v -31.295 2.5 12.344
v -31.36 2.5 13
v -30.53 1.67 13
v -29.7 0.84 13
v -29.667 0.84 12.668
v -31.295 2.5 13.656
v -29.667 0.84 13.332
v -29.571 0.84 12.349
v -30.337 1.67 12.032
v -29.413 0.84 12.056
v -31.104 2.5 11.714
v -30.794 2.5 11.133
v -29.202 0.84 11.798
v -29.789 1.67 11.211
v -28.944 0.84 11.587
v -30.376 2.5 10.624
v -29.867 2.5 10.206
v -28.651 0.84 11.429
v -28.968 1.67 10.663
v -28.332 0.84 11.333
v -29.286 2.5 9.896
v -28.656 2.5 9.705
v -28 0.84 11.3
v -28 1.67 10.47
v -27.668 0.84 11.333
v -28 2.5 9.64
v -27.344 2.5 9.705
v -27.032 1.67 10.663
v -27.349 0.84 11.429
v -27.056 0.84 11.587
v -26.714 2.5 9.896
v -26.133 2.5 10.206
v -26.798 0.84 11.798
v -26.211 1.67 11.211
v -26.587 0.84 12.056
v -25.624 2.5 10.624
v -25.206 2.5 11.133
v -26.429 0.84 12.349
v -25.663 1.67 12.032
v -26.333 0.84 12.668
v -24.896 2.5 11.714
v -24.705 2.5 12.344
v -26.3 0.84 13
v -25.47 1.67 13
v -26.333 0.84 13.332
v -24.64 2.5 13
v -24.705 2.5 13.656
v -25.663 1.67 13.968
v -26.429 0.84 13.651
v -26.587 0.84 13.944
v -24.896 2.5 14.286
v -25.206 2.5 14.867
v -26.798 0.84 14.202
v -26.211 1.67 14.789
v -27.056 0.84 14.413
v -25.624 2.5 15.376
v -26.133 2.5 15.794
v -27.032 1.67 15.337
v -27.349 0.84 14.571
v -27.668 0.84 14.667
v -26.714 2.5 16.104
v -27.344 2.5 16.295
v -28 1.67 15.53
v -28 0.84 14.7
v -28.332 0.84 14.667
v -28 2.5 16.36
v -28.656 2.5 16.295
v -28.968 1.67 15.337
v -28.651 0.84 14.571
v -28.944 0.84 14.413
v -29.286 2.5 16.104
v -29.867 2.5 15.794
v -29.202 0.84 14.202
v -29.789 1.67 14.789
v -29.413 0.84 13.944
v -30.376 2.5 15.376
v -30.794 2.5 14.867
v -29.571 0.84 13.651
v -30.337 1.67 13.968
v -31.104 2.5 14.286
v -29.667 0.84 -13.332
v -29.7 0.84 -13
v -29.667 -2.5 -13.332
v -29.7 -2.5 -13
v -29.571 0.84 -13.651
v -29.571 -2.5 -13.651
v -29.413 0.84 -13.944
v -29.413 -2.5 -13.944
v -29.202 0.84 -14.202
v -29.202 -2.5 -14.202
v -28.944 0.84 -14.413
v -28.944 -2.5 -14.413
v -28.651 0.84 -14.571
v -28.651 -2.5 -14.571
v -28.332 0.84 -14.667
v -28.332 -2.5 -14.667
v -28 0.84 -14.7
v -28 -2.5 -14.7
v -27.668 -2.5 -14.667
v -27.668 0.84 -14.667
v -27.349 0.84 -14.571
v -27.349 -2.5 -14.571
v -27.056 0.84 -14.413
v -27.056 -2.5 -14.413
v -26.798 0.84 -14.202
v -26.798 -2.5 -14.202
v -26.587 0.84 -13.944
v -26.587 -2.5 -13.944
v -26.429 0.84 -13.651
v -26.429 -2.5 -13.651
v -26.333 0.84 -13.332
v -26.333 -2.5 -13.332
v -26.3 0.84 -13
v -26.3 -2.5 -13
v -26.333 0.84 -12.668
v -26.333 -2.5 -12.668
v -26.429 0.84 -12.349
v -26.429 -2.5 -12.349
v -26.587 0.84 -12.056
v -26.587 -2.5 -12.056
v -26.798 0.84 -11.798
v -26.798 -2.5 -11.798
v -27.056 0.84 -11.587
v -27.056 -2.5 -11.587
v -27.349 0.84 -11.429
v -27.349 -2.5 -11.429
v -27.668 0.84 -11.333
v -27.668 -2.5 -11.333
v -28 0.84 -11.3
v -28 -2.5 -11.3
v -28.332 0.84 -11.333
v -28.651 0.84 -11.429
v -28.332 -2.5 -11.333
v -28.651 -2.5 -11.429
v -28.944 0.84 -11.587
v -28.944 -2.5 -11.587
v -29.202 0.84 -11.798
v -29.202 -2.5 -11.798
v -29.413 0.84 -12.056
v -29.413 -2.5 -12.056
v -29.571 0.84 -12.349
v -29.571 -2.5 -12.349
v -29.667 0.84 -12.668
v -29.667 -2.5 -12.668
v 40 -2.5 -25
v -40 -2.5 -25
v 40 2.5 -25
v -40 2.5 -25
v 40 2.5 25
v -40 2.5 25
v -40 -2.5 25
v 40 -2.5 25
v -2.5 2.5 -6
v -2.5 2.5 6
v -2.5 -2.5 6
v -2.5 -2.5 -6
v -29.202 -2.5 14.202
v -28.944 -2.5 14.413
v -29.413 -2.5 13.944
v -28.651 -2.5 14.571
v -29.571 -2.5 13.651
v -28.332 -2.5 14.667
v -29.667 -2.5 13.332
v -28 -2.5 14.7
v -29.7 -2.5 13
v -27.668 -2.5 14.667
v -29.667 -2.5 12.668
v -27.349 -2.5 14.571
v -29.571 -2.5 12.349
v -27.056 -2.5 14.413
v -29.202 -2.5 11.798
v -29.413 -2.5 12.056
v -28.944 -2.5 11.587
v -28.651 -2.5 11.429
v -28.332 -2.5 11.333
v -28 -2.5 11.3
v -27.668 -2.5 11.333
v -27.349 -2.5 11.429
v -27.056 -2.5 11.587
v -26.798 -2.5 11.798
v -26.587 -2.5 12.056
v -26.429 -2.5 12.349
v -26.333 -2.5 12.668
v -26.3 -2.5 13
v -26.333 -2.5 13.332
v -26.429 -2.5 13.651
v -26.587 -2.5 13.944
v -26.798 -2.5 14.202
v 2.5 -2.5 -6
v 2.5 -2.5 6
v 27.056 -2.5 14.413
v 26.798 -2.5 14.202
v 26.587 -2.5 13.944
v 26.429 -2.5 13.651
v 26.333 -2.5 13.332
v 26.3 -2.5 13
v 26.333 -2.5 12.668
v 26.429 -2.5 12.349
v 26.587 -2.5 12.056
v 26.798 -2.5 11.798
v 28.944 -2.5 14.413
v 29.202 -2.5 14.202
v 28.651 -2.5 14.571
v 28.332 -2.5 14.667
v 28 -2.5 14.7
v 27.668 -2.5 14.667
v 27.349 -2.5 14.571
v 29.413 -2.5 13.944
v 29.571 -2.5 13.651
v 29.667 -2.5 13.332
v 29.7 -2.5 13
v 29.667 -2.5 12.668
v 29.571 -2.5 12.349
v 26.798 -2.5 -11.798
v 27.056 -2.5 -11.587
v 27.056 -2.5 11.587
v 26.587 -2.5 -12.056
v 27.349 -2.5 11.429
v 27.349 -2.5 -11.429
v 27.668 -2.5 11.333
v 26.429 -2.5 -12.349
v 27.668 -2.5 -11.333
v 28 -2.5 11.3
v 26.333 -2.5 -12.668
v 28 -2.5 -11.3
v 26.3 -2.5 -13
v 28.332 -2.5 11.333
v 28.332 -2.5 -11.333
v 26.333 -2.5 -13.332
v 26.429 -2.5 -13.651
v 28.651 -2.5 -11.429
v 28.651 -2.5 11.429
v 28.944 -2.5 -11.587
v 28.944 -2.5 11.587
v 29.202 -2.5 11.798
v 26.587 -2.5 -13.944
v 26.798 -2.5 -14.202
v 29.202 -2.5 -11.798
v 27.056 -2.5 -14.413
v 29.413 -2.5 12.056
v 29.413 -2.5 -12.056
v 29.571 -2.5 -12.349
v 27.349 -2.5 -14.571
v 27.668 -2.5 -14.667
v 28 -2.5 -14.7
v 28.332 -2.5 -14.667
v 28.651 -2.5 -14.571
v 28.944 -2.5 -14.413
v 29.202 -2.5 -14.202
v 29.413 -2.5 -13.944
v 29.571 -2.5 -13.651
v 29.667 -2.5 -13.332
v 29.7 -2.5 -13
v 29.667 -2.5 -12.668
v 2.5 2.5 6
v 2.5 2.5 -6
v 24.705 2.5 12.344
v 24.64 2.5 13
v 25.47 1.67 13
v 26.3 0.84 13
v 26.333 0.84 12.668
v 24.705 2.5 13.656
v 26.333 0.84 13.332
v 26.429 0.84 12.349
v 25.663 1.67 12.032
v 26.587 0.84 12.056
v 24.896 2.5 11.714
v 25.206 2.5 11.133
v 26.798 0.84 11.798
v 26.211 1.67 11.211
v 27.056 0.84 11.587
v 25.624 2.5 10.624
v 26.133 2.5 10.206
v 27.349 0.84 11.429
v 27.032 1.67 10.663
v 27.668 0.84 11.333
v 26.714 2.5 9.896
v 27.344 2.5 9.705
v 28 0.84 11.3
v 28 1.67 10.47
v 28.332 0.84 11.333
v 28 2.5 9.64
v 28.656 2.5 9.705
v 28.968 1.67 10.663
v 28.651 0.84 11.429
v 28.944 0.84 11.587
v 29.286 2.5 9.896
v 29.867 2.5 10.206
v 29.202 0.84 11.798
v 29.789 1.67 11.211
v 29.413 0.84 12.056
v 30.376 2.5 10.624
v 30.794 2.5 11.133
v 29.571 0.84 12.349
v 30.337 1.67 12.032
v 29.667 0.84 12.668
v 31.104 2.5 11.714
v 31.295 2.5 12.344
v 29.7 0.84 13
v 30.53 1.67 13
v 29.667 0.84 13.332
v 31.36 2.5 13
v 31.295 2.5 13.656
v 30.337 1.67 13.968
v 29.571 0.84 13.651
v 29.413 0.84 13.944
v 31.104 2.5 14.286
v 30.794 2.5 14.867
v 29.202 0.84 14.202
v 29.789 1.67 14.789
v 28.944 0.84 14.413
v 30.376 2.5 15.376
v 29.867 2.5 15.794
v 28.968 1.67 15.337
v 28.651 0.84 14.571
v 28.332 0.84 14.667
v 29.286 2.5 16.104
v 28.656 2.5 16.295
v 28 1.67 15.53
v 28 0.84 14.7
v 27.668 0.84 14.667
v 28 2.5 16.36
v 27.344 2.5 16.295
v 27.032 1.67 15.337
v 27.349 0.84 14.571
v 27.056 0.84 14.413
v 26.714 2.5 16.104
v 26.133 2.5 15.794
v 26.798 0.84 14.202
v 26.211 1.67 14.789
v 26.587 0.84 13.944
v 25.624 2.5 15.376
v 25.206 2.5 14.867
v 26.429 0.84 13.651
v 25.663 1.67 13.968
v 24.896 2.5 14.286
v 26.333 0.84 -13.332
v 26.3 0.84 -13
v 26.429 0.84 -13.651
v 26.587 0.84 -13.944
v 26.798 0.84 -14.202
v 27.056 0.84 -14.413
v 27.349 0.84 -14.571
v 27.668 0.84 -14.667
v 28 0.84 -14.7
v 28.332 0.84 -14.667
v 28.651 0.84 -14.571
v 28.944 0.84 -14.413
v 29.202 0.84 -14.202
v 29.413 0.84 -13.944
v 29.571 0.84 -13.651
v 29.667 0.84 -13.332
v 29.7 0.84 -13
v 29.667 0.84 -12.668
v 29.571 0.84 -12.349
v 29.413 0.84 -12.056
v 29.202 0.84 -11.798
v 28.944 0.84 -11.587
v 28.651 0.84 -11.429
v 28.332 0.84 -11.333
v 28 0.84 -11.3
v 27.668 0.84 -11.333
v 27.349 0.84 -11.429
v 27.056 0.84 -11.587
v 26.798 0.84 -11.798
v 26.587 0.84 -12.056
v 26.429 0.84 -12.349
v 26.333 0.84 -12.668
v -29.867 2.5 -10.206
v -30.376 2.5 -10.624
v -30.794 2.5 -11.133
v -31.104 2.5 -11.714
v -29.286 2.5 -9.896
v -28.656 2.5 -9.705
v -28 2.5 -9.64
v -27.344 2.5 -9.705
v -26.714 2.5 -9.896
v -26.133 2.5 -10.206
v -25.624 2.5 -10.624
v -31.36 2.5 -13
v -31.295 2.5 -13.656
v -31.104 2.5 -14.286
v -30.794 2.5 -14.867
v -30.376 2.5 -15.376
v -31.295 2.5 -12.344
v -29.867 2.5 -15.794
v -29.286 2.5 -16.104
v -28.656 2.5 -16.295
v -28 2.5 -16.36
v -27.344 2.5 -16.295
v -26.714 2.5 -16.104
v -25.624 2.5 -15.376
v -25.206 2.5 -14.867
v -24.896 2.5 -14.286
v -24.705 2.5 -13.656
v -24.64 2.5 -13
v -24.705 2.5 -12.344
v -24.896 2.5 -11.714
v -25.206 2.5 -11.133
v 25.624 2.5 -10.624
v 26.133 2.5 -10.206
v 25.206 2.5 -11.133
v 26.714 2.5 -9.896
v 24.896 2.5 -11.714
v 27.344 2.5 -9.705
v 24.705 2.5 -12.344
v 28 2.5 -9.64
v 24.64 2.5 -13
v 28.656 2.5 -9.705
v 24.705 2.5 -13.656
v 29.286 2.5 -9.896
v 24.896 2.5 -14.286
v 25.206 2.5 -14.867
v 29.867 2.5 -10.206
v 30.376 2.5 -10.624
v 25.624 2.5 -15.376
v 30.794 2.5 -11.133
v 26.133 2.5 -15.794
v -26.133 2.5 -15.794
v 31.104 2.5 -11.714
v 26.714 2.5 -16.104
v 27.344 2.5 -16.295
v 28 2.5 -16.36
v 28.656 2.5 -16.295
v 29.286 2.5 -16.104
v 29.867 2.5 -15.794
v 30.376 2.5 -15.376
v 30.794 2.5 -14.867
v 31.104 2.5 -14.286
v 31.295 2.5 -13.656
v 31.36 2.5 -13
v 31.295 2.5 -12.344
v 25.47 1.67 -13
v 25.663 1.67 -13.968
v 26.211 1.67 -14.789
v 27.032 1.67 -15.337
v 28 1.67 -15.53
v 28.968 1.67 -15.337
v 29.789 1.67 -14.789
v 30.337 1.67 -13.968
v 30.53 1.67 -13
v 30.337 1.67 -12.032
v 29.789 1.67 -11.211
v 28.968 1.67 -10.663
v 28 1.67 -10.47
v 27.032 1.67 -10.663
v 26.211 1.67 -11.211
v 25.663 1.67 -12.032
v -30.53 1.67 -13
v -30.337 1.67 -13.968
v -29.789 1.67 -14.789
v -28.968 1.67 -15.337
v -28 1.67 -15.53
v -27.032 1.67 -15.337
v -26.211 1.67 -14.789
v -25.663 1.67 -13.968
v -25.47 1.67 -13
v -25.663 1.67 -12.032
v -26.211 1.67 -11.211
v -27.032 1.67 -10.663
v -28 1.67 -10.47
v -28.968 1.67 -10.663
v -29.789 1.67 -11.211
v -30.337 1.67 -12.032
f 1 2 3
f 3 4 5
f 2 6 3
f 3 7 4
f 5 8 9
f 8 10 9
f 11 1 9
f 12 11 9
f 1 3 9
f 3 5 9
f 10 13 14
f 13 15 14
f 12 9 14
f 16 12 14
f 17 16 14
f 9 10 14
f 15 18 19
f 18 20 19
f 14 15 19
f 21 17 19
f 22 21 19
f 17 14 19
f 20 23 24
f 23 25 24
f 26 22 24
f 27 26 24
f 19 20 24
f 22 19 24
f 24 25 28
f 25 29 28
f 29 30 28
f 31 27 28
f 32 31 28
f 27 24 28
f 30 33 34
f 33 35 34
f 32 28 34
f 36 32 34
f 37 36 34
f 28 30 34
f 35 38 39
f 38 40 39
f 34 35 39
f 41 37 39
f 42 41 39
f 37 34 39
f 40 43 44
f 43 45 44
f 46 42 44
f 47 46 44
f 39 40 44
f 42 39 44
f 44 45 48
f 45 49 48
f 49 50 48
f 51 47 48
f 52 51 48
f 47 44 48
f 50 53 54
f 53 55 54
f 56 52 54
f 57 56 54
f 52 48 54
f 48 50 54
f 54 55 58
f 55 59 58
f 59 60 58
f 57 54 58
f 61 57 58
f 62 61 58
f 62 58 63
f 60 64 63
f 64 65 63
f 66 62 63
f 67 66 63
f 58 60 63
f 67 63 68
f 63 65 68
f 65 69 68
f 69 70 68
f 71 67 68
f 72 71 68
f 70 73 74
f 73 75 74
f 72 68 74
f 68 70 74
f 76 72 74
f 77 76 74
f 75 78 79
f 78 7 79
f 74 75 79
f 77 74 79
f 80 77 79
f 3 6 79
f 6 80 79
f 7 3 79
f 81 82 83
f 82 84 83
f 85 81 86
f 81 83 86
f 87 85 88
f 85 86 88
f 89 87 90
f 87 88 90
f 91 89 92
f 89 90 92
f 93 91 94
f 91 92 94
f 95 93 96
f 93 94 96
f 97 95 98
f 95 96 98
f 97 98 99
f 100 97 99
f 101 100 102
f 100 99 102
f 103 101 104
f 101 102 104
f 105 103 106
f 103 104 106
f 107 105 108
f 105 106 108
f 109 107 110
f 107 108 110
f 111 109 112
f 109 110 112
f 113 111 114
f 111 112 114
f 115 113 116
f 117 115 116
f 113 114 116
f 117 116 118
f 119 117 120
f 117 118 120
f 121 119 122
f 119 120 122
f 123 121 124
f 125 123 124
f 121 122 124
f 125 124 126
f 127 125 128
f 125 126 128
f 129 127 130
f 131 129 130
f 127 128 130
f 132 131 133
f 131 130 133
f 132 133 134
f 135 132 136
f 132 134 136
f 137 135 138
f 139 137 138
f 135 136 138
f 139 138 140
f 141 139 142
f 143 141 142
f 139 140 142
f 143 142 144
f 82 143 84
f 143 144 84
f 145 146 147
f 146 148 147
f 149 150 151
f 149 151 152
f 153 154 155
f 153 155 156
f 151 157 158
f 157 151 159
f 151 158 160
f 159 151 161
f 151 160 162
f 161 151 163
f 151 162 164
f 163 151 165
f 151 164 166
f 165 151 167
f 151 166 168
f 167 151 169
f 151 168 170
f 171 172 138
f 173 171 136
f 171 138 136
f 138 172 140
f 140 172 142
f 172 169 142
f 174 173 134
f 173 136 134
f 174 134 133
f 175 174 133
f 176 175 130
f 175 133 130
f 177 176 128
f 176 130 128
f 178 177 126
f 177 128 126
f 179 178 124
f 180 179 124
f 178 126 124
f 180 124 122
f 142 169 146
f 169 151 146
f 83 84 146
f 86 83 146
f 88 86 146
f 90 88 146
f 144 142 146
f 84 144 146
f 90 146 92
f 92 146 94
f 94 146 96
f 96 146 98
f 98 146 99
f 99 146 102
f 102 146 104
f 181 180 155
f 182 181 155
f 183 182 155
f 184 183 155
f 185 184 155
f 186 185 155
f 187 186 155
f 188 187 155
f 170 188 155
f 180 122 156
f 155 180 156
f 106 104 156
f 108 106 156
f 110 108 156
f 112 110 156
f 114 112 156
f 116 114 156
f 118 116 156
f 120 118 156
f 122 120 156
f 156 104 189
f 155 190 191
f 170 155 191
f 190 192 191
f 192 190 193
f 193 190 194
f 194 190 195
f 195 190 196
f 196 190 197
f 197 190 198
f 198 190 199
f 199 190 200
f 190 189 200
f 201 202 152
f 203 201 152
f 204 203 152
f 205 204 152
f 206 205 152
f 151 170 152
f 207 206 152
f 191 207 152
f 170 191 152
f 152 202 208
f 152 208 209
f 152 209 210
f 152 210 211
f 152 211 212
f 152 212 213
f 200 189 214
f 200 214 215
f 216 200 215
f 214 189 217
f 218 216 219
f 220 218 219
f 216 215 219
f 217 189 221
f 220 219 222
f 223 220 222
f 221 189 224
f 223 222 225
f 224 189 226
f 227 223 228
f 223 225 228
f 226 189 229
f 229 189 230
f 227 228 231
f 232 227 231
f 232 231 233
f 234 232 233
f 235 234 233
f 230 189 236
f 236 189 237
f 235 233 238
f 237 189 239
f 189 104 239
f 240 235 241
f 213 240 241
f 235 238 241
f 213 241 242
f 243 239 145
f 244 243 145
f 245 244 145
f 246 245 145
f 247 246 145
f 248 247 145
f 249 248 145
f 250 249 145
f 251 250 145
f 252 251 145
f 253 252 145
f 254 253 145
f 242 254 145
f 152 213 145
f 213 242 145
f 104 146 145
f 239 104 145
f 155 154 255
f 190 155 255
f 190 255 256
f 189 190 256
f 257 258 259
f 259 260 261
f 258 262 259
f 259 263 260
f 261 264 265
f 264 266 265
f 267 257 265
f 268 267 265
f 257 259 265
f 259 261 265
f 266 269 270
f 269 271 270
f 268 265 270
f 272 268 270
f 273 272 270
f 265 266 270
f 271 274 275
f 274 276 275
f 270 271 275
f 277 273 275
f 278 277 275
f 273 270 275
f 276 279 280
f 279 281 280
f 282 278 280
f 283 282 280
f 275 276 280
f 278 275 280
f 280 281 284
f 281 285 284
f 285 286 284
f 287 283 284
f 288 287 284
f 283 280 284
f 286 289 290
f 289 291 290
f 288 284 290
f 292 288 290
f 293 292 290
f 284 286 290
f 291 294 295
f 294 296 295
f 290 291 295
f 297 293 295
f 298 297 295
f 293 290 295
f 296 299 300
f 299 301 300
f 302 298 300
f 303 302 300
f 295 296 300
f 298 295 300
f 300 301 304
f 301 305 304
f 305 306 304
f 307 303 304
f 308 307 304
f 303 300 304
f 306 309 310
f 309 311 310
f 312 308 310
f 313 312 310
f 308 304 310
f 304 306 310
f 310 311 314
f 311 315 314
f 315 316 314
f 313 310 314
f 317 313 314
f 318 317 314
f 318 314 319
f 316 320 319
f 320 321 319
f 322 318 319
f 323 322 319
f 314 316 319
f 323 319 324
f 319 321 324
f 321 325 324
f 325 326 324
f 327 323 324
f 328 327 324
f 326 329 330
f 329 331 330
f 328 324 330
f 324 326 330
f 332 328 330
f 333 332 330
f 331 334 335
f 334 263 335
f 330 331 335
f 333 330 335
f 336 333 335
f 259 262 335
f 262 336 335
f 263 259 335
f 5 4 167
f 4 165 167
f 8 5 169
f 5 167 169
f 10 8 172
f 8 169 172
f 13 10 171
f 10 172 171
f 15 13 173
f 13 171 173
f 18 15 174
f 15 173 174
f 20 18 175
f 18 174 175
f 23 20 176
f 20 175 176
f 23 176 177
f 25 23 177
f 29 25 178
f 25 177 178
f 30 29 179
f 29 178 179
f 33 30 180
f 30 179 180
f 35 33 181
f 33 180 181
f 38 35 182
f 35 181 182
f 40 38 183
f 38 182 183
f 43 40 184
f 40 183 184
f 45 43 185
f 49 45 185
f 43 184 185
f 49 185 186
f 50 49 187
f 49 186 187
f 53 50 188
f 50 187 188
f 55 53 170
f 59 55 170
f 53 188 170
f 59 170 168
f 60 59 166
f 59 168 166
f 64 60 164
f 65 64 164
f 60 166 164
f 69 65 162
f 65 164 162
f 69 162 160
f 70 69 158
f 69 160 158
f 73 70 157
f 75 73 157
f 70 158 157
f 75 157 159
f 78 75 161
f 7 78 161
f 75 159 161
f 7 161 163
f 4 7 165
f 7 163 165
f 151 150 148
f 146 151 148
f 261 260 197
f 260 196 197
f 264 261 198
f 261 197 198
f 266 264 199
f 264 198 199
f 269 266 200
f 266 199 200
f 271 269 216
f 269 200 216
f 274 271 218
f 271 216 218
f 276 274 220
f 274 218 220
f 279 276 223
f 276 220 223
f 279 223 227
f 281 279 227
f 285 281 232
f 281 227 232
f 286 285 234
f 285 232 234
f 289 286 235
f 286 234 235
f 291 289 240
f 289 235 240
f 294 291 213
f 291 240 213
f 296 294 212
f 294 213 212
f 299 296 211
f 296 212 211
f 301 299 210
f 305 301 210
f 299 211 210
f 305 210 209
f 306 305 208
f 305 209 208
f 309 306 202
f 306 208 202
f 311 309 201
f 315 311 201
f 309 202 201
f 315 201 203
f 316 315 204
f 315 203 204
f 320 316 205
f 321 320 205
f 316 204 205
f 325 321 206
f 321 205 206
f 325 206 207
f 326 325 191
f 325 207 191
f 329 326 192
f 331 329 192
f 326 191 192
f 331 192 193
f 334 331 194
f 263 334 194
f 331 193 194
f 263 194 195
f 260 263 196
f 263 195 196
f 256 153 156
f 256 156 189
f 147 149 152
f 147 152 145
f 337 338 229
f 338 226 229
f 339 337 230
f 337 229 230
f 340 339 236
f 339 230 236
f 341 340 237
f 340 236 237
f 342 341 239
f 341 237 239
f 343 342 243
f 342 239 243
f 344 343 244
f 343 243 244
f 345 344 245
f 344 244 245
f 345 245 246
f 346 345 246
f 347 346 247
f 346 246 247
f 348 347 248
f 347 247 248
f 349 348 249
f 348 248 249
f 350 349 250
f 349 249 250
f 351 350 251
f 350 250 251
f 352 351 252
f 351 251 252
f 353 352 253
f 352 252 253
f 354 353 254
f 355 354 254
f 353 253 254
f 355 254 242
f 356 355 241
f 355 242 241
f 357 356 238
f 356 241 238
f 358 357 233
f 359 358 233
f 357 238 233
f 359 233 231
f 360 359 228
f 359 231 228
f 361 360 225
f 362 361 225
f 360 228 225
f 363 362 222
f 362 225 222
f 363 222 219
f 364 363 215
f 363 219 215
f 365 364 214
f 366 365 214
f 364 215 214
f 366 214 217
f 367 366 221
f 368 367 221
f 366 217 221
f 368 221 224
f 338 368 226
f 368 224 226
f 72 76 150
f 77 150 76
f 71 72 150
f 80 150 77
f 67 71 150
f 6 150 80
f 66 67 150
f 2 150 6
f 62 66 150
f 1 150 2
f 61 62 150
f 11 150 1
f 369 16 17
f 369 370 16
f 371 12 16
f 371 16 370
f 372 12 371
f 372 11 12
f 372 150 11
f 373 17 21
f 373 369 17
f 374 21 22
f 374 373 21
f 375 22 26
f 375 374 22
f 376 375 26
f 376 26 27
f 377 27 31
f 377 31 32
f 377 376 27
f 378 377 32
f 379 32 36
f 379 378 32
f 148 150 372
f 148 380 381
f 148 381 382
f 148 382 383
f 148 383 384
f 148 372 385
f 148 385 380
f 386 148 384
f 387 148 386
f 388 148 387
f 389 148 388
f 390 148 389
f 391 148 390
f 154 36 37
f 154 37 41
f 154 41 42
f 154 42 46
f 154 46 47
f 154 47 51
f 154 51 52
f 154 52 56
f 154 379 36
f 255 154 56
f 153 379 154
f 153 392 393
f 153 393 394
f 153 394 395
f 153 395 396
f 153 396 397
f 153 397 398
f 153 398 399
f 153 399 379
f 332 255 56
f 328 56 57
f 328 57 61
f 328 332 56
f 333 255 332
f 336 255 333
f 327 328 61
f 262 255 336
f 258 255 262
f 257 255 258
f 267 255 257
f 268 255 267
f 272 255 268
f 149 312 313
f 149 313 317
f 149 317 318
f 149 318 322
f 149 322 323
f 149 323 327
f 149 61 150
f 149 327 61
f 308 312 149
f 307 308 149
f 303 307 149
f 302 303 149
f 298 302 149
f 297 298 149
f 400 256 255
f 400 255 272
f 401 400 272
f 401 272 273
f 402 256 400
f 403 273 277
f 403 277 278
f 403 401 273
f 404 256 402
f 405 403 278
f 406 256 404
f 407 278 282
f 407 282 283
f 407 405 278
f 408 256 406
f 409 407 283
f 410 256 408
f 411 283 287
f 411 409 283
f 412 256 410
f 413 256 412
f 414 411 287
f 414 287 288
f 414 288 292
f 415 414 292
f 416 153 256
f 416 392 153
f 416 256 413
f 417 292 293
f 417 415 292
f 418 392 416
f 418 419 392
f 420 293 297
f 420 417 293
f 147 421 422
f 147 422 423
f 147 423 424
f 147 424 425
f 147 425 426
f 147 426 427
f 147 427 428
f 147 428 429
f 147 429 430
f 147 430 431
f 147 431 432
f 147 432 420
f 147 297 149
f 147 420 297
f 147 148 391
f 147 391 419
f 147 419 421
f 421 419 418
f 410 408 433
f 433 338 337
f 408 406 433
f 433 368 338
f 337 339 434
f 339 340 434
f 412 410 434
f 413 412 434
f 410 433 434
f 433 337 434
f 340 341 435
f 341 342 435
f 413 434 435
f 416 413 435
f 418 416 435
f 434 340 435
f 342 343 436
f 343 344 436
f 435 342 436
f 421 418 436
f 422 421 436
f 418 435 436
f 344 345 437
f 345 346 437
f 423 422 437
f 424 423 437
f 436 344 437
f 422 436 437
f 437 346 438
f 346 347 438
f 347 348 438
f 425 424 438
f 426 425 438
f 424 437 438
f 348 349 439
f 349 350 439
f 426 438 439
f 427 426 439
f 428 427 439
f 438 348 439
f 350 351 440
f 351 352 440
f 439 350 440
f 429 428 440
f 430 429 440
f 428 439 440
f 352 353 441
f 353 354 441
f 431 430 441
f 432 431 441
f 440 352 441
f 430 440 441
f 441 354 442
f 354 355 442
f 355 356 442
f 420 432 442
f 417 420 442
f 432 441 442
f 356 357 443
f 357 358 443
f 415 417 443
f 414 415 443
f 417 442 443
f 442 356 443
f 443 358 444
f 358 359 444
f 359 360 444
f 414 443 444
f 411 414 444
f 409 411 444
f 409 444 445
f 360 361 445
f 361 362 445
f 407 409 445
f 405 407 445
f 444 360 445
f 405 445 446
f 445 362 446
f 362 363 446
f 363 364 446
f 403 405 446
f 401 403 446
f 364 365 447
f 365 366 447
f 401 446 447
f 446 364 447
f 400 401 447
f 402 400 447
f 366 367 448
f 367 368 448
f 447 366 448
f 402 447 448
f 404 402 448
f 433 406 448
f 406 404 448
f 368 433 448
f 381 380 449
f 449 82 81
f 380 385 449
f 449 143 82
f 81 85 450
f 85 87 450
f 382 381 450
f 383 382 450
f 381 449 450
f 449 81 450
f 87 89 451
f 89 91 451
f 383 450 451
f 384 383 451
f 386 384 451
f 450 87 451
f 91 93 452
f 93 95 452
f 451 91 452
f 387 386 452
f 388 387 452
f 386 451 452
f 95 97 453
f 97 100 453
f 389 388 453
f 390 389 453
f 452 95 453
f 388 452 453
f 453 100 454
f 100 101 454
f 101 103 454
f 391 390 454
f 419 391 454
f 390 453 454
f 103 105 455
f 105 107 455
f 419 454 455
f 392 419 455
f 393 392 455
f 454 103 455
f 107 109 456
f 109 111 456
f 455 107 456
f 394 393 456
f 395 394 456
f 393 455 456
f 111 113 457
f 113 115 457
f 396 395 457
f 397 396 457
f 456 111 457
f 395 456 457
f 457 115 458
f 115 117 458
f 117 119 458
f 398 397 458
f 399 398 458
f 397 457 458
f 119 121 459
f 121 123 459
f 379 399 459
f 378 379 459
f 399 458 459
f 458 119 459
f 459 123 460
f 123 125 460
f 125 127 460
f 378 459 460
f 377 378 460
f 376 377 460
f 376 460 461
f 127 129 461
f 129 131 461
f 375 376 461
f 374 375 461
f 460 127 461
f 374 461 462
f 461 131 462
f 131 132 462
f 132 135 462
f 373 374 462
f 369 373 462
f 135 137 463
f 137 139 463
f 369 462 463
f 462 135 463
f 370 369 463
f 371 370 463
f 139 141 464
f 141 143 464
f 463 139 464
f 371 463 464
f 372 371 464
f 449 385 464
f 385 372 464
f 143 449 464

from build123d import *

# Parameters (mm, degrees)
SKETCH1_W                                            = 80
SKETCH1_H                                            = 50
BOSS_EXTRUDE1_DEPTH                                  = 2.5
SKETCH2_W                                            = 5
SKETCH2_H                                            = 12
CUT_EXTRUDE1_DEPTH                                   = 5
CSK_FOR_M3_HEX_SOCKET_COUNTERSUNK_CAP_SC_D           = 3.4
CSK_FOR_M3_HEX_SOCKET_COUNTERSUNK_CAP_SC_CSINK_D     = 6.72
CSK_FOR_M3_HEX_SOCKET_COUNTERSUNK_CAP_SC_CSINK_ANGLE = 90


with BuildPart() as part:
    # Sketch1 → Boss-Extrude1 (new, symmetric)
    with BuildSketch(Plane(origin=(0, 0, 0), x_dir=(1, 0, 0), z_dir=(0, 1, 0))):
        Rectangle(SKETCH1_W, SKETCH1_H)
    extrude(amount=BOSS_EXTRUDE1_DEPTH, both=True)

    # Sketch2 → Cut-Extrude1 (cut)
    with BuildSketch(Plane(origin=(0, 2.5, 0), x_dir=(1, 0, 0), z_dir=(0, 1, 0))):
        Rectangle(SKETCH2_W, SKETCH2_H)
    extrude(amount=-CUT_EXTRUDE1_DEPTH, mode=Mode.SUBTRACT)

    # CSK for M3 Hex Socket Countersunk Cap Screw1 (through all)
    with Locations(Plane(origin=(0, 2.5, 0), x_dir=(1, 0, 0), z_dir=(0, 1, 0))):
        with Locations((28, -13), (28, 13), (-28, -13), (-28, 13)):
            CounterSinkHole(CSK_FOR_M3_HEX_SOCKET_COUNTERSUNK_CAP_SC_D / 2, CSK_FOR_M3_HEX_SOCKET_COUNTERSUNK_CAP_SC_CSINK_D / 2, counter_sink_angle=CSK_FOR_M3_HEX_SOCKET_COUNTERSUNK_CAP_SC_CSINK_ANGLE)


solid = part.part
